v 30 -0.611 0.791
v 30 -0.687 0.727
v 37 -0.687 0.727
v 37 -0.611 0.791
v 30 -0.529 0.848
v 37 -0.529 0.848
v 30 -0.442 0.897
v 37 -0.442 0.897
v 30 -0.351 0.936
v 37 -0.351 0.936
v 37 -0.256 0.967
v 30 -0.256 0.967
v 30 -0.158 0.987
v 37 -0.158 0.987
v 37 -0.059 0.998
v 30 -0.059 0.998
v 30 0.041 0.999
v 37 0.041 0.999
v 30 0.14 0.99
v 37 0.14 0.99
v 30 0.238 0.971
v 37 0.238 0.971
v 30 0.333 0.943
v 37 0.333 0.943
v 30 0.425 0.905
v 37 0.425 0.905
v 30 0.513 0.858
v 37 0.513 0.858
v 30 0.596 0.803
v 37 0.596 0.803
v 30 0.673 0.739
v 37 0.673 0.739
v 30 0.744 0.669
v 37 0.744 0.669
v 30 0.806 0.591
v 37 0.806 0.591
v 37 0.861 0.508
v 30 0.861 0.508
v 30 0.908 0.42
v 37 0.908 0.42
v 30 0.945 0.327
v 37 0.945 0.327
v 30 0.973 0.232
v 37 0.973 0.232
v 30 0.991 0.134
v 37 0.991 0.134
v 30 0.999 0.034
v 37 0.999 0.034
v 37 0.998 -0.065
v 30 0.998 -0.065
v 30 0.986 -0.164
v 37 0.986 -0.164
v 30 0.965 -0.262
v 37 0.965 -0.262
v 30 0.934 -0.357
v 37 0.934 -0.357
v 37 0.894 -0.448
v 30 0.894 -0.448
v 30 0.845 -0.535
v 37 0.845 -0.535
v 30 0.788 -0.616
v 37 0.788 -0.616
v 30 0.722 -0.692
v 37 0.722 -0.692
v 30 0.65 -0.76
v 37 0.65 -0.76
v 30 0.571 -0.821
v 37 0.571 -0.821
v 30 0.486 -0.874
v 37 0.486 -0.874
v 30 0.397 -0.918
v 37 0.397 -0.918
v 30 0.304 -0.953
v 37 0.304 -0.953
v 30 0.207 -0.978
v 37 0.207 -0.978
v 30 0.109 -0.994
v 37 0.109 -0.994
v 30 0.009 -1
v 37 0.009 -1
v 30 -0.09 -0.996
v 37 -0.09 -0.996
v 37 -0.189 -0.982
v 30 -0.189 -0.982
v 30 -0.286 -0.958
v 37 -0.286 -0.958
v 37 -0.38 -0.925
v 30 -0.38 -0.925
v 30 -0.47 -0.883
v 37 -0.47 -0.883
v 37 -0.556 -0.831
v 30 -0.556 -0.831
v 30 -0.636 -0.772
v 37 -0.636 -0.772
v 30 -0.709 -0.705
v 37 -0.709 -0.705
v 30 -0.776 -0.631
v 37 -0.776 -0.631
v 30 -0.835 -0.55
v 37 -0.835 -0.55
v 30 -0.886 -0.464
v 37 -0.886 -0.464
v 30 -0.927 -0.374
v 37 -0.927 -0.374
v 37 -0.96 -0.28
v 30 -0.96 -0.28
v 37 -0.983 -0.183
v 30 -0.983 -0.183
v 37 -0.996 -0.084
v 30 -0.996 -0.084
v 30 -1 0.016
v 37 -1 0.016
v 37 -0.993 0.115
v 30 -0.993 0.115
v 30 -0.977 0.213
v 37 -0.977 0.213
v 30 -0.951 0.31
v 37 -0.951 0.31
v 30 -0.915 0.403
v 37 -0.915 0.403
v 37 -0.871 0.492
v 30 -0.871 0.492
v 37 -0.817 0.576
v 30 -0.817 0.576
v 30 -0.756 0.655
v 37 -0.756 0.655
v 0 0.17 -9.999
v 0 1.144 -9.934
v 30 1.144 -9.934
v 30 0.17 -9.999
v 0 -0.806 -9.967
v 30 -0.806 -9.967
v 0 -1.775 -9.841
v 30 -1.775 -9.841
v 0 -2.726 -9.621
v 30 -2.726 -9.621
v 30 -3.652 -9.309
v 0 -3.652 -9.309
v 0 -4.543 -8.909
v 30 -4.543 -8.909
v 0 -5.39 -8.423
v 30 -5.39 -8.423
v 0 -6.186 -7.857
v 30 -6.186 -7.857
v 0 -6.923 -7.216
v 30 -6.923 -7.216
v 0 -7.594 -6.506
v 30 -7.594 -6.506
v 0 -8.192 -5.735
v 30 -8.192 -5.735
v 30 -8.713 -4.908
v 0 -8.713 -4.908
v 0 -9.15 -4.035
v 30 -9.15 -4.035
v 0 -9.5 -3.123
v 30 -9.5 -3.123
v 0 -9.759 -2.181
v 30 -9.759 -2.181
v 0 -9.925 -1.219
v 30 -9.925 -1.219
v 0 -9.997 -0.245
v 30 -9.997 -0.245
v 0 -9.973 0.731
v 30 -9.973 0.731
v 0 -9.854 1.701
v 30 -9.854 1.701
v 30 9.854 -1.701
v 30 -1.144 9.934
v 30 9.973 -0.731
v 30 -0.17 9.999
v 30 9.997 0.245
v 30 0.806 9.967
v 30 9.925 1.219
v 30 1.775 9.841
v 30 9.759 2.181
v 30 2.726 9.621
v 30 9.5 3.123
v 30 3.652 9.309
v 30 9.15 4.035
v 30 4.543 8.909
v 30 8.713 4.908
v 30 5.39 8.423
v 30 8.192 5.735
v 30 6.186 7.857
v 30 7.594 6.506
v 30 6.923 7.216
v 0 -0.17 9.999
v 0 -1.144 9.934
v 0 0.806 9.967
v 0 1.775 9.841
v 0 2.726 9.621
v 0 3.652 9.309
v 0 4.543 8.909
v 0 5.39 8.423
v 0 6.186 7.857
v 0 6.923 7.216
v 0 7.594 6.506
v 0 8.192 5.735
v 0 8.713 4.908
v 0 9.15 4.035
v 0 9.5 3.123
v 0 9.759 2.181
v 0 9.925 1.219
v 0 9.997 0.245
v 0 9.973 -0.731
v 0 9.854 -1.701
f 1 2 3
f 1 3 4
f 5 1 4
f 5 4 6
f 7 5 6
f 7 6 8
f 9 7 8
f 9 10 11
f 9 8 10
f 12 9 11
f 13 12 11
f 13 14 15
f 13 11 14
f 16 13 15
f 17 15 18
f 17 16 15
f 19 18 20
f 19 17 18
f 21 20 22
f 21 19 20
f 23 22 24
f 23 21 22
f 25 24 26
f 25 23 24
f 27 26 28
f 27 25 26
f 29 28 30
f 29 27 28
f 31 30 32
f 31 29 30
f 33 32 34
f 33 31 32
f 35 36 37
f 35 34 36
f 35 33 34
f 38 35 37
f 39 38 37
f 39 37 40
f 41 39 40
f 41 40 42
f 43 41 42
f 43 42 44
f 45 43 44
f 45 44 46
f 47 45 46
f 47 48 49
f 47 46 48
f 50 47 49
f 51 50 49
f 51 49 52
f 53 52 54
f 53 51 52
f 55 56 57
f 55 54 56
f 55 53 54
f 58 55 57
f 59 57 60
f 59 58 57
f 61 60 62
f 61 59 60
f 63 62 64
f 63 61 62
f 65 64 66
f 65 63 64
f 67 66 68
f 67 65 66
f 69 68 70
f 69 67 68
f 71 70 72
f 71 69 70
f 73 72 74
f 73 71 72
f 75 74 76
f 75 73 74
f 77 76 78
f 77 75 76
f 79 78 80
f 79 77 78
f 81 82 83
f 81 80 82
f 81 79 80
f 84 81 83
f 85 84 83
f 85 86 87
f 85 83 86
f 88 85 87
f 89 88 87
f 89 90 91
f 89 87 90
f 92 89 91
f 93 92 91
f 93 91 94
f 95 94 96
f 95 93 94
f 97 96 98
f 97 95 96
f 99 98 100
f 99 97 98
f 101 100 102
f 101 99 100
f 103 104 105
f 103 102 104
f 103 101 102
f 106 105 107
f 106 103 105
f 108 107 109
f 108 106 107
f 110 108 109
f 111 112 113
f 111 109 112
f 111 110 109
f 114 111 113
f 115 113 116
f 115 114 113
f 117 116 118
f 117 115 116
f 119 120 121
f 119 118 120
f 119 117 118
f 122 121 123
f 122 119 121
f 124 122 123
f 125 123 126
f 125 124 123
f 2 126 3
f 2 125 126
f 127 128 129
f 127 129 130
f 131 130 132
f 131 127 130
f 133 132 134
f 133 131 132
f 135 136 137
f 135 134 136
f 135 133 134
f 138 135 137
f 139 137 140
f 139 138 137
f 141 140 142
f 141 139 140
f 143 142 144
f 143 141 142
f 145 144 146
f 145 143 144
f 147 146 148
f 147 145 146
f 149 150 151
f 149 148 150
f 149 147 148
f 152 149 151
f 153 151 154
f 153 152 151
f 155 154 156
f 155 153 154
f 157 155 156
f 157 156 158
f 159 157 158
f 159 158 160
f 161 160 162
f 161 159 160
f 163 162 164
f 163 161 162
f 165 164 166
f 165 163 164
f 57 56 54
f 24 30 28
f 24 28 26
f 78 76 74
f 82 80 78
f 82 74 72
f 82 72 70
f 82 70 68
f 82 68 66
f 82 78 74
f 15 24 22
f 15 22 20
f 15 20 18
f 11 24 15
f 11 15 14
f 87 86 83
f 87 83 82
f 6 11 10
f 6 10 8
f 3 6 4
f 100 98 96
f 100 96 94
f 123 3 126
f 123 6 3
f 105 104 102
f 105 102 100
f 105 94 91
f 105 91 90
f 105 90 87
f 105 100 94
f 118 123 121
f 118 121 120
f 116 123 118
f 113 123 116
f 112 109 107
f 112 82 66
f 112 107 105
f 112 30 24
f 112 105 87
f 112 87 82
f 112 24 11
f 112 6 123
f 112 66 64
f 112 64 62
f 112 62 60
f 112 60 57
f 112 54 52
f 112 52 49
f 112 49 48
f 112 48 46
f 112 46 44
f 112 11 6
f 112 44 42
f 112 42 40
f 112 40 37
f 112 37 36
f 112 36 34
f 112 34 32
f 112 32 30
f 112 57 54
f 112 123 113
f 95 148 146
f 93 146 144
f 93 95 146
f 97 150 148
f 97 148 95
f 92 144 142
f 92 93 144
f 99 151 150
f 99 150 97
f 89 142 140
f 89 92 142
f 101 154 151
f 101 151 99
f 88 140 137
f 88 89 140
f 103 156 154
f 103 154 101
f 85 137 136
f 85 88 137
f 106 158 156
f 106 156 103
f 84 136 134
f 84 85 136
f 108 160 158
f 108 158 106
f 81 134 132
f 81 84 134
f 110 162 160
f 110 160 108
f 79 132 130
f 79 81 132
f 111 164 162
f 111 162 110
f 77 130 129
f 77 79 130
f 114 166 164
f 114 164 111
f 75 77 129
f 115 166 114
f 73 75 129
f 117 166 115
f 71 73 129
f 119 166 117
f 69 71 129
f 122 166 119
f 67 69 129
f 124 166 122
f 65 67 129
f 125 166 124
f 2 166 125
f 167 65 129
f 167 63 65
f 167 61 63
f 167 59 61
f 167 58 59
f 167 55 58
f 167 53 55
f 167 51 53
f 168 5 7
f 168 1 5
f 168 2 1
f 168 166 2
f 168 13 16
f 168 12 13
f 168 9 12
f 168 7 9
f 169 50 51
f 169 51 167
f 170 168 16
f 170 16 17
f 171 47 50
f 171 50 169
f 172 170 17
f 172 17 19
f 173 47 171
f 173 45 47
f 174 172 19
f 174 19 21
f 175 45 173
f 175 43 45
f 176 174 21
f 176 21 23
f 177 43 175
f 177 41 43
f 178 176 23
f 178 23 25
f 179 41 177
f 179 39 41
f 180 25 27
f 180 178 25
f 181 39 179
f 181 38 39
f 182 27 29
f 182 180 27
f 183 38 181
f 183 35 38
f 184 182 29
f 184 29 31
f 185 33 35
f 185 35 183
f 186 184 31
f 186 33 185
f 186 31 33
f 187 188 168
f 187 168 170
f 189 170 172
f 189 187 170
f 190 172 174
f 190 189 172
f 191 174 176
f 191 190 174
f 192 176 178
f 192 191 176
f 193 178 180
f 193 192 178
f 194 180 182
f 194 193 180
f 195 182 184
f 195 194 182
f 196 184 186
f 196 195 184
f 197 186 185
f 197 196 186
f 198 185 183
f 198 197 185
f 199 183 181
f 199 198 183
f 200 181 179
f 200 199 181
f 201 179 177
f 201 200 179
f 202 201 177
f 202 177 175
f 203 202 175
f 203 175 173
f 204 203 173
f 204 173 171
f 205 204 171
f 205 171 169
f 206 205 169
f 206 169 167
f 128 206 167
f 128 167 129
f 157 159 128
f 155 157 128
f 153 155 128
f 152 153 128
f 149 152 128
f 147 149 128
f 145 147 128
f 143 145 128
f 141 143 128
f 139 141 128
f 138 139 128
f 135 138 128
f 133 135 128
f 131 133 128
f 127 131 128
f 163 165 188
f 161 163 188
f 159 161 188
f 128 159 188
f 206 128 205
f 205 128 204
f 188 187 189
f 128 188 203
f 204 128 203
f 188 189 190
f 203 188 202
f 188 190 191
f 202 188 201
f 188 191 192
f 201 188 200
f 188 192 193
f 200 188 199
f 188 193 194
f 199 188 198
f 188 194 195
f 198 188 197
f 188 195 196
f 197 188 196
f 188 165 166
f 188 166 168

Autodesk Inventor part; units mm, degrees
ref_plane "YZ Plane" through (0, 0, 0) normal (1, 0, 0) x (0, 1, 0)
ref_plane "XZ Plane" through (0, 0, 0) normal (0, 1, 0) x (-1, 0, 0)
ref_plane "XY Plane" through (0, 0, 0) normal (0, 0, 1) x (1, 0, 0)
sketch "Skizze1" plane through (0, 0, 0) normal (1, 0, 0) x (0, 1, 0)
  circle A0 centre (0, 0) radius 10
  line L0 (-9.8543, 1.7009) -> (-1.1444, 9.9343)
  line L1 (9.8543, -1.7009) -> (1.1444, -9.9343)
  dimension "d0" = 20
extrude "Extrusion1" add sketch "Skizze1" along normal blind 30 contours A0 L1 L0
sketch "Skizze2" plane through (30, 0, 0) normal (1, 0, 0) x (0, -0.687, 0.7267)
  circle A0 centre (0, 0) radius 10 projected
  circle A1 centre (0, 0) radius 1
  dimension "d3" = 2
extrude "Extrusion2" add sketch "Skizze2" along normal blind 7 contours A1
properties part number "motor"
